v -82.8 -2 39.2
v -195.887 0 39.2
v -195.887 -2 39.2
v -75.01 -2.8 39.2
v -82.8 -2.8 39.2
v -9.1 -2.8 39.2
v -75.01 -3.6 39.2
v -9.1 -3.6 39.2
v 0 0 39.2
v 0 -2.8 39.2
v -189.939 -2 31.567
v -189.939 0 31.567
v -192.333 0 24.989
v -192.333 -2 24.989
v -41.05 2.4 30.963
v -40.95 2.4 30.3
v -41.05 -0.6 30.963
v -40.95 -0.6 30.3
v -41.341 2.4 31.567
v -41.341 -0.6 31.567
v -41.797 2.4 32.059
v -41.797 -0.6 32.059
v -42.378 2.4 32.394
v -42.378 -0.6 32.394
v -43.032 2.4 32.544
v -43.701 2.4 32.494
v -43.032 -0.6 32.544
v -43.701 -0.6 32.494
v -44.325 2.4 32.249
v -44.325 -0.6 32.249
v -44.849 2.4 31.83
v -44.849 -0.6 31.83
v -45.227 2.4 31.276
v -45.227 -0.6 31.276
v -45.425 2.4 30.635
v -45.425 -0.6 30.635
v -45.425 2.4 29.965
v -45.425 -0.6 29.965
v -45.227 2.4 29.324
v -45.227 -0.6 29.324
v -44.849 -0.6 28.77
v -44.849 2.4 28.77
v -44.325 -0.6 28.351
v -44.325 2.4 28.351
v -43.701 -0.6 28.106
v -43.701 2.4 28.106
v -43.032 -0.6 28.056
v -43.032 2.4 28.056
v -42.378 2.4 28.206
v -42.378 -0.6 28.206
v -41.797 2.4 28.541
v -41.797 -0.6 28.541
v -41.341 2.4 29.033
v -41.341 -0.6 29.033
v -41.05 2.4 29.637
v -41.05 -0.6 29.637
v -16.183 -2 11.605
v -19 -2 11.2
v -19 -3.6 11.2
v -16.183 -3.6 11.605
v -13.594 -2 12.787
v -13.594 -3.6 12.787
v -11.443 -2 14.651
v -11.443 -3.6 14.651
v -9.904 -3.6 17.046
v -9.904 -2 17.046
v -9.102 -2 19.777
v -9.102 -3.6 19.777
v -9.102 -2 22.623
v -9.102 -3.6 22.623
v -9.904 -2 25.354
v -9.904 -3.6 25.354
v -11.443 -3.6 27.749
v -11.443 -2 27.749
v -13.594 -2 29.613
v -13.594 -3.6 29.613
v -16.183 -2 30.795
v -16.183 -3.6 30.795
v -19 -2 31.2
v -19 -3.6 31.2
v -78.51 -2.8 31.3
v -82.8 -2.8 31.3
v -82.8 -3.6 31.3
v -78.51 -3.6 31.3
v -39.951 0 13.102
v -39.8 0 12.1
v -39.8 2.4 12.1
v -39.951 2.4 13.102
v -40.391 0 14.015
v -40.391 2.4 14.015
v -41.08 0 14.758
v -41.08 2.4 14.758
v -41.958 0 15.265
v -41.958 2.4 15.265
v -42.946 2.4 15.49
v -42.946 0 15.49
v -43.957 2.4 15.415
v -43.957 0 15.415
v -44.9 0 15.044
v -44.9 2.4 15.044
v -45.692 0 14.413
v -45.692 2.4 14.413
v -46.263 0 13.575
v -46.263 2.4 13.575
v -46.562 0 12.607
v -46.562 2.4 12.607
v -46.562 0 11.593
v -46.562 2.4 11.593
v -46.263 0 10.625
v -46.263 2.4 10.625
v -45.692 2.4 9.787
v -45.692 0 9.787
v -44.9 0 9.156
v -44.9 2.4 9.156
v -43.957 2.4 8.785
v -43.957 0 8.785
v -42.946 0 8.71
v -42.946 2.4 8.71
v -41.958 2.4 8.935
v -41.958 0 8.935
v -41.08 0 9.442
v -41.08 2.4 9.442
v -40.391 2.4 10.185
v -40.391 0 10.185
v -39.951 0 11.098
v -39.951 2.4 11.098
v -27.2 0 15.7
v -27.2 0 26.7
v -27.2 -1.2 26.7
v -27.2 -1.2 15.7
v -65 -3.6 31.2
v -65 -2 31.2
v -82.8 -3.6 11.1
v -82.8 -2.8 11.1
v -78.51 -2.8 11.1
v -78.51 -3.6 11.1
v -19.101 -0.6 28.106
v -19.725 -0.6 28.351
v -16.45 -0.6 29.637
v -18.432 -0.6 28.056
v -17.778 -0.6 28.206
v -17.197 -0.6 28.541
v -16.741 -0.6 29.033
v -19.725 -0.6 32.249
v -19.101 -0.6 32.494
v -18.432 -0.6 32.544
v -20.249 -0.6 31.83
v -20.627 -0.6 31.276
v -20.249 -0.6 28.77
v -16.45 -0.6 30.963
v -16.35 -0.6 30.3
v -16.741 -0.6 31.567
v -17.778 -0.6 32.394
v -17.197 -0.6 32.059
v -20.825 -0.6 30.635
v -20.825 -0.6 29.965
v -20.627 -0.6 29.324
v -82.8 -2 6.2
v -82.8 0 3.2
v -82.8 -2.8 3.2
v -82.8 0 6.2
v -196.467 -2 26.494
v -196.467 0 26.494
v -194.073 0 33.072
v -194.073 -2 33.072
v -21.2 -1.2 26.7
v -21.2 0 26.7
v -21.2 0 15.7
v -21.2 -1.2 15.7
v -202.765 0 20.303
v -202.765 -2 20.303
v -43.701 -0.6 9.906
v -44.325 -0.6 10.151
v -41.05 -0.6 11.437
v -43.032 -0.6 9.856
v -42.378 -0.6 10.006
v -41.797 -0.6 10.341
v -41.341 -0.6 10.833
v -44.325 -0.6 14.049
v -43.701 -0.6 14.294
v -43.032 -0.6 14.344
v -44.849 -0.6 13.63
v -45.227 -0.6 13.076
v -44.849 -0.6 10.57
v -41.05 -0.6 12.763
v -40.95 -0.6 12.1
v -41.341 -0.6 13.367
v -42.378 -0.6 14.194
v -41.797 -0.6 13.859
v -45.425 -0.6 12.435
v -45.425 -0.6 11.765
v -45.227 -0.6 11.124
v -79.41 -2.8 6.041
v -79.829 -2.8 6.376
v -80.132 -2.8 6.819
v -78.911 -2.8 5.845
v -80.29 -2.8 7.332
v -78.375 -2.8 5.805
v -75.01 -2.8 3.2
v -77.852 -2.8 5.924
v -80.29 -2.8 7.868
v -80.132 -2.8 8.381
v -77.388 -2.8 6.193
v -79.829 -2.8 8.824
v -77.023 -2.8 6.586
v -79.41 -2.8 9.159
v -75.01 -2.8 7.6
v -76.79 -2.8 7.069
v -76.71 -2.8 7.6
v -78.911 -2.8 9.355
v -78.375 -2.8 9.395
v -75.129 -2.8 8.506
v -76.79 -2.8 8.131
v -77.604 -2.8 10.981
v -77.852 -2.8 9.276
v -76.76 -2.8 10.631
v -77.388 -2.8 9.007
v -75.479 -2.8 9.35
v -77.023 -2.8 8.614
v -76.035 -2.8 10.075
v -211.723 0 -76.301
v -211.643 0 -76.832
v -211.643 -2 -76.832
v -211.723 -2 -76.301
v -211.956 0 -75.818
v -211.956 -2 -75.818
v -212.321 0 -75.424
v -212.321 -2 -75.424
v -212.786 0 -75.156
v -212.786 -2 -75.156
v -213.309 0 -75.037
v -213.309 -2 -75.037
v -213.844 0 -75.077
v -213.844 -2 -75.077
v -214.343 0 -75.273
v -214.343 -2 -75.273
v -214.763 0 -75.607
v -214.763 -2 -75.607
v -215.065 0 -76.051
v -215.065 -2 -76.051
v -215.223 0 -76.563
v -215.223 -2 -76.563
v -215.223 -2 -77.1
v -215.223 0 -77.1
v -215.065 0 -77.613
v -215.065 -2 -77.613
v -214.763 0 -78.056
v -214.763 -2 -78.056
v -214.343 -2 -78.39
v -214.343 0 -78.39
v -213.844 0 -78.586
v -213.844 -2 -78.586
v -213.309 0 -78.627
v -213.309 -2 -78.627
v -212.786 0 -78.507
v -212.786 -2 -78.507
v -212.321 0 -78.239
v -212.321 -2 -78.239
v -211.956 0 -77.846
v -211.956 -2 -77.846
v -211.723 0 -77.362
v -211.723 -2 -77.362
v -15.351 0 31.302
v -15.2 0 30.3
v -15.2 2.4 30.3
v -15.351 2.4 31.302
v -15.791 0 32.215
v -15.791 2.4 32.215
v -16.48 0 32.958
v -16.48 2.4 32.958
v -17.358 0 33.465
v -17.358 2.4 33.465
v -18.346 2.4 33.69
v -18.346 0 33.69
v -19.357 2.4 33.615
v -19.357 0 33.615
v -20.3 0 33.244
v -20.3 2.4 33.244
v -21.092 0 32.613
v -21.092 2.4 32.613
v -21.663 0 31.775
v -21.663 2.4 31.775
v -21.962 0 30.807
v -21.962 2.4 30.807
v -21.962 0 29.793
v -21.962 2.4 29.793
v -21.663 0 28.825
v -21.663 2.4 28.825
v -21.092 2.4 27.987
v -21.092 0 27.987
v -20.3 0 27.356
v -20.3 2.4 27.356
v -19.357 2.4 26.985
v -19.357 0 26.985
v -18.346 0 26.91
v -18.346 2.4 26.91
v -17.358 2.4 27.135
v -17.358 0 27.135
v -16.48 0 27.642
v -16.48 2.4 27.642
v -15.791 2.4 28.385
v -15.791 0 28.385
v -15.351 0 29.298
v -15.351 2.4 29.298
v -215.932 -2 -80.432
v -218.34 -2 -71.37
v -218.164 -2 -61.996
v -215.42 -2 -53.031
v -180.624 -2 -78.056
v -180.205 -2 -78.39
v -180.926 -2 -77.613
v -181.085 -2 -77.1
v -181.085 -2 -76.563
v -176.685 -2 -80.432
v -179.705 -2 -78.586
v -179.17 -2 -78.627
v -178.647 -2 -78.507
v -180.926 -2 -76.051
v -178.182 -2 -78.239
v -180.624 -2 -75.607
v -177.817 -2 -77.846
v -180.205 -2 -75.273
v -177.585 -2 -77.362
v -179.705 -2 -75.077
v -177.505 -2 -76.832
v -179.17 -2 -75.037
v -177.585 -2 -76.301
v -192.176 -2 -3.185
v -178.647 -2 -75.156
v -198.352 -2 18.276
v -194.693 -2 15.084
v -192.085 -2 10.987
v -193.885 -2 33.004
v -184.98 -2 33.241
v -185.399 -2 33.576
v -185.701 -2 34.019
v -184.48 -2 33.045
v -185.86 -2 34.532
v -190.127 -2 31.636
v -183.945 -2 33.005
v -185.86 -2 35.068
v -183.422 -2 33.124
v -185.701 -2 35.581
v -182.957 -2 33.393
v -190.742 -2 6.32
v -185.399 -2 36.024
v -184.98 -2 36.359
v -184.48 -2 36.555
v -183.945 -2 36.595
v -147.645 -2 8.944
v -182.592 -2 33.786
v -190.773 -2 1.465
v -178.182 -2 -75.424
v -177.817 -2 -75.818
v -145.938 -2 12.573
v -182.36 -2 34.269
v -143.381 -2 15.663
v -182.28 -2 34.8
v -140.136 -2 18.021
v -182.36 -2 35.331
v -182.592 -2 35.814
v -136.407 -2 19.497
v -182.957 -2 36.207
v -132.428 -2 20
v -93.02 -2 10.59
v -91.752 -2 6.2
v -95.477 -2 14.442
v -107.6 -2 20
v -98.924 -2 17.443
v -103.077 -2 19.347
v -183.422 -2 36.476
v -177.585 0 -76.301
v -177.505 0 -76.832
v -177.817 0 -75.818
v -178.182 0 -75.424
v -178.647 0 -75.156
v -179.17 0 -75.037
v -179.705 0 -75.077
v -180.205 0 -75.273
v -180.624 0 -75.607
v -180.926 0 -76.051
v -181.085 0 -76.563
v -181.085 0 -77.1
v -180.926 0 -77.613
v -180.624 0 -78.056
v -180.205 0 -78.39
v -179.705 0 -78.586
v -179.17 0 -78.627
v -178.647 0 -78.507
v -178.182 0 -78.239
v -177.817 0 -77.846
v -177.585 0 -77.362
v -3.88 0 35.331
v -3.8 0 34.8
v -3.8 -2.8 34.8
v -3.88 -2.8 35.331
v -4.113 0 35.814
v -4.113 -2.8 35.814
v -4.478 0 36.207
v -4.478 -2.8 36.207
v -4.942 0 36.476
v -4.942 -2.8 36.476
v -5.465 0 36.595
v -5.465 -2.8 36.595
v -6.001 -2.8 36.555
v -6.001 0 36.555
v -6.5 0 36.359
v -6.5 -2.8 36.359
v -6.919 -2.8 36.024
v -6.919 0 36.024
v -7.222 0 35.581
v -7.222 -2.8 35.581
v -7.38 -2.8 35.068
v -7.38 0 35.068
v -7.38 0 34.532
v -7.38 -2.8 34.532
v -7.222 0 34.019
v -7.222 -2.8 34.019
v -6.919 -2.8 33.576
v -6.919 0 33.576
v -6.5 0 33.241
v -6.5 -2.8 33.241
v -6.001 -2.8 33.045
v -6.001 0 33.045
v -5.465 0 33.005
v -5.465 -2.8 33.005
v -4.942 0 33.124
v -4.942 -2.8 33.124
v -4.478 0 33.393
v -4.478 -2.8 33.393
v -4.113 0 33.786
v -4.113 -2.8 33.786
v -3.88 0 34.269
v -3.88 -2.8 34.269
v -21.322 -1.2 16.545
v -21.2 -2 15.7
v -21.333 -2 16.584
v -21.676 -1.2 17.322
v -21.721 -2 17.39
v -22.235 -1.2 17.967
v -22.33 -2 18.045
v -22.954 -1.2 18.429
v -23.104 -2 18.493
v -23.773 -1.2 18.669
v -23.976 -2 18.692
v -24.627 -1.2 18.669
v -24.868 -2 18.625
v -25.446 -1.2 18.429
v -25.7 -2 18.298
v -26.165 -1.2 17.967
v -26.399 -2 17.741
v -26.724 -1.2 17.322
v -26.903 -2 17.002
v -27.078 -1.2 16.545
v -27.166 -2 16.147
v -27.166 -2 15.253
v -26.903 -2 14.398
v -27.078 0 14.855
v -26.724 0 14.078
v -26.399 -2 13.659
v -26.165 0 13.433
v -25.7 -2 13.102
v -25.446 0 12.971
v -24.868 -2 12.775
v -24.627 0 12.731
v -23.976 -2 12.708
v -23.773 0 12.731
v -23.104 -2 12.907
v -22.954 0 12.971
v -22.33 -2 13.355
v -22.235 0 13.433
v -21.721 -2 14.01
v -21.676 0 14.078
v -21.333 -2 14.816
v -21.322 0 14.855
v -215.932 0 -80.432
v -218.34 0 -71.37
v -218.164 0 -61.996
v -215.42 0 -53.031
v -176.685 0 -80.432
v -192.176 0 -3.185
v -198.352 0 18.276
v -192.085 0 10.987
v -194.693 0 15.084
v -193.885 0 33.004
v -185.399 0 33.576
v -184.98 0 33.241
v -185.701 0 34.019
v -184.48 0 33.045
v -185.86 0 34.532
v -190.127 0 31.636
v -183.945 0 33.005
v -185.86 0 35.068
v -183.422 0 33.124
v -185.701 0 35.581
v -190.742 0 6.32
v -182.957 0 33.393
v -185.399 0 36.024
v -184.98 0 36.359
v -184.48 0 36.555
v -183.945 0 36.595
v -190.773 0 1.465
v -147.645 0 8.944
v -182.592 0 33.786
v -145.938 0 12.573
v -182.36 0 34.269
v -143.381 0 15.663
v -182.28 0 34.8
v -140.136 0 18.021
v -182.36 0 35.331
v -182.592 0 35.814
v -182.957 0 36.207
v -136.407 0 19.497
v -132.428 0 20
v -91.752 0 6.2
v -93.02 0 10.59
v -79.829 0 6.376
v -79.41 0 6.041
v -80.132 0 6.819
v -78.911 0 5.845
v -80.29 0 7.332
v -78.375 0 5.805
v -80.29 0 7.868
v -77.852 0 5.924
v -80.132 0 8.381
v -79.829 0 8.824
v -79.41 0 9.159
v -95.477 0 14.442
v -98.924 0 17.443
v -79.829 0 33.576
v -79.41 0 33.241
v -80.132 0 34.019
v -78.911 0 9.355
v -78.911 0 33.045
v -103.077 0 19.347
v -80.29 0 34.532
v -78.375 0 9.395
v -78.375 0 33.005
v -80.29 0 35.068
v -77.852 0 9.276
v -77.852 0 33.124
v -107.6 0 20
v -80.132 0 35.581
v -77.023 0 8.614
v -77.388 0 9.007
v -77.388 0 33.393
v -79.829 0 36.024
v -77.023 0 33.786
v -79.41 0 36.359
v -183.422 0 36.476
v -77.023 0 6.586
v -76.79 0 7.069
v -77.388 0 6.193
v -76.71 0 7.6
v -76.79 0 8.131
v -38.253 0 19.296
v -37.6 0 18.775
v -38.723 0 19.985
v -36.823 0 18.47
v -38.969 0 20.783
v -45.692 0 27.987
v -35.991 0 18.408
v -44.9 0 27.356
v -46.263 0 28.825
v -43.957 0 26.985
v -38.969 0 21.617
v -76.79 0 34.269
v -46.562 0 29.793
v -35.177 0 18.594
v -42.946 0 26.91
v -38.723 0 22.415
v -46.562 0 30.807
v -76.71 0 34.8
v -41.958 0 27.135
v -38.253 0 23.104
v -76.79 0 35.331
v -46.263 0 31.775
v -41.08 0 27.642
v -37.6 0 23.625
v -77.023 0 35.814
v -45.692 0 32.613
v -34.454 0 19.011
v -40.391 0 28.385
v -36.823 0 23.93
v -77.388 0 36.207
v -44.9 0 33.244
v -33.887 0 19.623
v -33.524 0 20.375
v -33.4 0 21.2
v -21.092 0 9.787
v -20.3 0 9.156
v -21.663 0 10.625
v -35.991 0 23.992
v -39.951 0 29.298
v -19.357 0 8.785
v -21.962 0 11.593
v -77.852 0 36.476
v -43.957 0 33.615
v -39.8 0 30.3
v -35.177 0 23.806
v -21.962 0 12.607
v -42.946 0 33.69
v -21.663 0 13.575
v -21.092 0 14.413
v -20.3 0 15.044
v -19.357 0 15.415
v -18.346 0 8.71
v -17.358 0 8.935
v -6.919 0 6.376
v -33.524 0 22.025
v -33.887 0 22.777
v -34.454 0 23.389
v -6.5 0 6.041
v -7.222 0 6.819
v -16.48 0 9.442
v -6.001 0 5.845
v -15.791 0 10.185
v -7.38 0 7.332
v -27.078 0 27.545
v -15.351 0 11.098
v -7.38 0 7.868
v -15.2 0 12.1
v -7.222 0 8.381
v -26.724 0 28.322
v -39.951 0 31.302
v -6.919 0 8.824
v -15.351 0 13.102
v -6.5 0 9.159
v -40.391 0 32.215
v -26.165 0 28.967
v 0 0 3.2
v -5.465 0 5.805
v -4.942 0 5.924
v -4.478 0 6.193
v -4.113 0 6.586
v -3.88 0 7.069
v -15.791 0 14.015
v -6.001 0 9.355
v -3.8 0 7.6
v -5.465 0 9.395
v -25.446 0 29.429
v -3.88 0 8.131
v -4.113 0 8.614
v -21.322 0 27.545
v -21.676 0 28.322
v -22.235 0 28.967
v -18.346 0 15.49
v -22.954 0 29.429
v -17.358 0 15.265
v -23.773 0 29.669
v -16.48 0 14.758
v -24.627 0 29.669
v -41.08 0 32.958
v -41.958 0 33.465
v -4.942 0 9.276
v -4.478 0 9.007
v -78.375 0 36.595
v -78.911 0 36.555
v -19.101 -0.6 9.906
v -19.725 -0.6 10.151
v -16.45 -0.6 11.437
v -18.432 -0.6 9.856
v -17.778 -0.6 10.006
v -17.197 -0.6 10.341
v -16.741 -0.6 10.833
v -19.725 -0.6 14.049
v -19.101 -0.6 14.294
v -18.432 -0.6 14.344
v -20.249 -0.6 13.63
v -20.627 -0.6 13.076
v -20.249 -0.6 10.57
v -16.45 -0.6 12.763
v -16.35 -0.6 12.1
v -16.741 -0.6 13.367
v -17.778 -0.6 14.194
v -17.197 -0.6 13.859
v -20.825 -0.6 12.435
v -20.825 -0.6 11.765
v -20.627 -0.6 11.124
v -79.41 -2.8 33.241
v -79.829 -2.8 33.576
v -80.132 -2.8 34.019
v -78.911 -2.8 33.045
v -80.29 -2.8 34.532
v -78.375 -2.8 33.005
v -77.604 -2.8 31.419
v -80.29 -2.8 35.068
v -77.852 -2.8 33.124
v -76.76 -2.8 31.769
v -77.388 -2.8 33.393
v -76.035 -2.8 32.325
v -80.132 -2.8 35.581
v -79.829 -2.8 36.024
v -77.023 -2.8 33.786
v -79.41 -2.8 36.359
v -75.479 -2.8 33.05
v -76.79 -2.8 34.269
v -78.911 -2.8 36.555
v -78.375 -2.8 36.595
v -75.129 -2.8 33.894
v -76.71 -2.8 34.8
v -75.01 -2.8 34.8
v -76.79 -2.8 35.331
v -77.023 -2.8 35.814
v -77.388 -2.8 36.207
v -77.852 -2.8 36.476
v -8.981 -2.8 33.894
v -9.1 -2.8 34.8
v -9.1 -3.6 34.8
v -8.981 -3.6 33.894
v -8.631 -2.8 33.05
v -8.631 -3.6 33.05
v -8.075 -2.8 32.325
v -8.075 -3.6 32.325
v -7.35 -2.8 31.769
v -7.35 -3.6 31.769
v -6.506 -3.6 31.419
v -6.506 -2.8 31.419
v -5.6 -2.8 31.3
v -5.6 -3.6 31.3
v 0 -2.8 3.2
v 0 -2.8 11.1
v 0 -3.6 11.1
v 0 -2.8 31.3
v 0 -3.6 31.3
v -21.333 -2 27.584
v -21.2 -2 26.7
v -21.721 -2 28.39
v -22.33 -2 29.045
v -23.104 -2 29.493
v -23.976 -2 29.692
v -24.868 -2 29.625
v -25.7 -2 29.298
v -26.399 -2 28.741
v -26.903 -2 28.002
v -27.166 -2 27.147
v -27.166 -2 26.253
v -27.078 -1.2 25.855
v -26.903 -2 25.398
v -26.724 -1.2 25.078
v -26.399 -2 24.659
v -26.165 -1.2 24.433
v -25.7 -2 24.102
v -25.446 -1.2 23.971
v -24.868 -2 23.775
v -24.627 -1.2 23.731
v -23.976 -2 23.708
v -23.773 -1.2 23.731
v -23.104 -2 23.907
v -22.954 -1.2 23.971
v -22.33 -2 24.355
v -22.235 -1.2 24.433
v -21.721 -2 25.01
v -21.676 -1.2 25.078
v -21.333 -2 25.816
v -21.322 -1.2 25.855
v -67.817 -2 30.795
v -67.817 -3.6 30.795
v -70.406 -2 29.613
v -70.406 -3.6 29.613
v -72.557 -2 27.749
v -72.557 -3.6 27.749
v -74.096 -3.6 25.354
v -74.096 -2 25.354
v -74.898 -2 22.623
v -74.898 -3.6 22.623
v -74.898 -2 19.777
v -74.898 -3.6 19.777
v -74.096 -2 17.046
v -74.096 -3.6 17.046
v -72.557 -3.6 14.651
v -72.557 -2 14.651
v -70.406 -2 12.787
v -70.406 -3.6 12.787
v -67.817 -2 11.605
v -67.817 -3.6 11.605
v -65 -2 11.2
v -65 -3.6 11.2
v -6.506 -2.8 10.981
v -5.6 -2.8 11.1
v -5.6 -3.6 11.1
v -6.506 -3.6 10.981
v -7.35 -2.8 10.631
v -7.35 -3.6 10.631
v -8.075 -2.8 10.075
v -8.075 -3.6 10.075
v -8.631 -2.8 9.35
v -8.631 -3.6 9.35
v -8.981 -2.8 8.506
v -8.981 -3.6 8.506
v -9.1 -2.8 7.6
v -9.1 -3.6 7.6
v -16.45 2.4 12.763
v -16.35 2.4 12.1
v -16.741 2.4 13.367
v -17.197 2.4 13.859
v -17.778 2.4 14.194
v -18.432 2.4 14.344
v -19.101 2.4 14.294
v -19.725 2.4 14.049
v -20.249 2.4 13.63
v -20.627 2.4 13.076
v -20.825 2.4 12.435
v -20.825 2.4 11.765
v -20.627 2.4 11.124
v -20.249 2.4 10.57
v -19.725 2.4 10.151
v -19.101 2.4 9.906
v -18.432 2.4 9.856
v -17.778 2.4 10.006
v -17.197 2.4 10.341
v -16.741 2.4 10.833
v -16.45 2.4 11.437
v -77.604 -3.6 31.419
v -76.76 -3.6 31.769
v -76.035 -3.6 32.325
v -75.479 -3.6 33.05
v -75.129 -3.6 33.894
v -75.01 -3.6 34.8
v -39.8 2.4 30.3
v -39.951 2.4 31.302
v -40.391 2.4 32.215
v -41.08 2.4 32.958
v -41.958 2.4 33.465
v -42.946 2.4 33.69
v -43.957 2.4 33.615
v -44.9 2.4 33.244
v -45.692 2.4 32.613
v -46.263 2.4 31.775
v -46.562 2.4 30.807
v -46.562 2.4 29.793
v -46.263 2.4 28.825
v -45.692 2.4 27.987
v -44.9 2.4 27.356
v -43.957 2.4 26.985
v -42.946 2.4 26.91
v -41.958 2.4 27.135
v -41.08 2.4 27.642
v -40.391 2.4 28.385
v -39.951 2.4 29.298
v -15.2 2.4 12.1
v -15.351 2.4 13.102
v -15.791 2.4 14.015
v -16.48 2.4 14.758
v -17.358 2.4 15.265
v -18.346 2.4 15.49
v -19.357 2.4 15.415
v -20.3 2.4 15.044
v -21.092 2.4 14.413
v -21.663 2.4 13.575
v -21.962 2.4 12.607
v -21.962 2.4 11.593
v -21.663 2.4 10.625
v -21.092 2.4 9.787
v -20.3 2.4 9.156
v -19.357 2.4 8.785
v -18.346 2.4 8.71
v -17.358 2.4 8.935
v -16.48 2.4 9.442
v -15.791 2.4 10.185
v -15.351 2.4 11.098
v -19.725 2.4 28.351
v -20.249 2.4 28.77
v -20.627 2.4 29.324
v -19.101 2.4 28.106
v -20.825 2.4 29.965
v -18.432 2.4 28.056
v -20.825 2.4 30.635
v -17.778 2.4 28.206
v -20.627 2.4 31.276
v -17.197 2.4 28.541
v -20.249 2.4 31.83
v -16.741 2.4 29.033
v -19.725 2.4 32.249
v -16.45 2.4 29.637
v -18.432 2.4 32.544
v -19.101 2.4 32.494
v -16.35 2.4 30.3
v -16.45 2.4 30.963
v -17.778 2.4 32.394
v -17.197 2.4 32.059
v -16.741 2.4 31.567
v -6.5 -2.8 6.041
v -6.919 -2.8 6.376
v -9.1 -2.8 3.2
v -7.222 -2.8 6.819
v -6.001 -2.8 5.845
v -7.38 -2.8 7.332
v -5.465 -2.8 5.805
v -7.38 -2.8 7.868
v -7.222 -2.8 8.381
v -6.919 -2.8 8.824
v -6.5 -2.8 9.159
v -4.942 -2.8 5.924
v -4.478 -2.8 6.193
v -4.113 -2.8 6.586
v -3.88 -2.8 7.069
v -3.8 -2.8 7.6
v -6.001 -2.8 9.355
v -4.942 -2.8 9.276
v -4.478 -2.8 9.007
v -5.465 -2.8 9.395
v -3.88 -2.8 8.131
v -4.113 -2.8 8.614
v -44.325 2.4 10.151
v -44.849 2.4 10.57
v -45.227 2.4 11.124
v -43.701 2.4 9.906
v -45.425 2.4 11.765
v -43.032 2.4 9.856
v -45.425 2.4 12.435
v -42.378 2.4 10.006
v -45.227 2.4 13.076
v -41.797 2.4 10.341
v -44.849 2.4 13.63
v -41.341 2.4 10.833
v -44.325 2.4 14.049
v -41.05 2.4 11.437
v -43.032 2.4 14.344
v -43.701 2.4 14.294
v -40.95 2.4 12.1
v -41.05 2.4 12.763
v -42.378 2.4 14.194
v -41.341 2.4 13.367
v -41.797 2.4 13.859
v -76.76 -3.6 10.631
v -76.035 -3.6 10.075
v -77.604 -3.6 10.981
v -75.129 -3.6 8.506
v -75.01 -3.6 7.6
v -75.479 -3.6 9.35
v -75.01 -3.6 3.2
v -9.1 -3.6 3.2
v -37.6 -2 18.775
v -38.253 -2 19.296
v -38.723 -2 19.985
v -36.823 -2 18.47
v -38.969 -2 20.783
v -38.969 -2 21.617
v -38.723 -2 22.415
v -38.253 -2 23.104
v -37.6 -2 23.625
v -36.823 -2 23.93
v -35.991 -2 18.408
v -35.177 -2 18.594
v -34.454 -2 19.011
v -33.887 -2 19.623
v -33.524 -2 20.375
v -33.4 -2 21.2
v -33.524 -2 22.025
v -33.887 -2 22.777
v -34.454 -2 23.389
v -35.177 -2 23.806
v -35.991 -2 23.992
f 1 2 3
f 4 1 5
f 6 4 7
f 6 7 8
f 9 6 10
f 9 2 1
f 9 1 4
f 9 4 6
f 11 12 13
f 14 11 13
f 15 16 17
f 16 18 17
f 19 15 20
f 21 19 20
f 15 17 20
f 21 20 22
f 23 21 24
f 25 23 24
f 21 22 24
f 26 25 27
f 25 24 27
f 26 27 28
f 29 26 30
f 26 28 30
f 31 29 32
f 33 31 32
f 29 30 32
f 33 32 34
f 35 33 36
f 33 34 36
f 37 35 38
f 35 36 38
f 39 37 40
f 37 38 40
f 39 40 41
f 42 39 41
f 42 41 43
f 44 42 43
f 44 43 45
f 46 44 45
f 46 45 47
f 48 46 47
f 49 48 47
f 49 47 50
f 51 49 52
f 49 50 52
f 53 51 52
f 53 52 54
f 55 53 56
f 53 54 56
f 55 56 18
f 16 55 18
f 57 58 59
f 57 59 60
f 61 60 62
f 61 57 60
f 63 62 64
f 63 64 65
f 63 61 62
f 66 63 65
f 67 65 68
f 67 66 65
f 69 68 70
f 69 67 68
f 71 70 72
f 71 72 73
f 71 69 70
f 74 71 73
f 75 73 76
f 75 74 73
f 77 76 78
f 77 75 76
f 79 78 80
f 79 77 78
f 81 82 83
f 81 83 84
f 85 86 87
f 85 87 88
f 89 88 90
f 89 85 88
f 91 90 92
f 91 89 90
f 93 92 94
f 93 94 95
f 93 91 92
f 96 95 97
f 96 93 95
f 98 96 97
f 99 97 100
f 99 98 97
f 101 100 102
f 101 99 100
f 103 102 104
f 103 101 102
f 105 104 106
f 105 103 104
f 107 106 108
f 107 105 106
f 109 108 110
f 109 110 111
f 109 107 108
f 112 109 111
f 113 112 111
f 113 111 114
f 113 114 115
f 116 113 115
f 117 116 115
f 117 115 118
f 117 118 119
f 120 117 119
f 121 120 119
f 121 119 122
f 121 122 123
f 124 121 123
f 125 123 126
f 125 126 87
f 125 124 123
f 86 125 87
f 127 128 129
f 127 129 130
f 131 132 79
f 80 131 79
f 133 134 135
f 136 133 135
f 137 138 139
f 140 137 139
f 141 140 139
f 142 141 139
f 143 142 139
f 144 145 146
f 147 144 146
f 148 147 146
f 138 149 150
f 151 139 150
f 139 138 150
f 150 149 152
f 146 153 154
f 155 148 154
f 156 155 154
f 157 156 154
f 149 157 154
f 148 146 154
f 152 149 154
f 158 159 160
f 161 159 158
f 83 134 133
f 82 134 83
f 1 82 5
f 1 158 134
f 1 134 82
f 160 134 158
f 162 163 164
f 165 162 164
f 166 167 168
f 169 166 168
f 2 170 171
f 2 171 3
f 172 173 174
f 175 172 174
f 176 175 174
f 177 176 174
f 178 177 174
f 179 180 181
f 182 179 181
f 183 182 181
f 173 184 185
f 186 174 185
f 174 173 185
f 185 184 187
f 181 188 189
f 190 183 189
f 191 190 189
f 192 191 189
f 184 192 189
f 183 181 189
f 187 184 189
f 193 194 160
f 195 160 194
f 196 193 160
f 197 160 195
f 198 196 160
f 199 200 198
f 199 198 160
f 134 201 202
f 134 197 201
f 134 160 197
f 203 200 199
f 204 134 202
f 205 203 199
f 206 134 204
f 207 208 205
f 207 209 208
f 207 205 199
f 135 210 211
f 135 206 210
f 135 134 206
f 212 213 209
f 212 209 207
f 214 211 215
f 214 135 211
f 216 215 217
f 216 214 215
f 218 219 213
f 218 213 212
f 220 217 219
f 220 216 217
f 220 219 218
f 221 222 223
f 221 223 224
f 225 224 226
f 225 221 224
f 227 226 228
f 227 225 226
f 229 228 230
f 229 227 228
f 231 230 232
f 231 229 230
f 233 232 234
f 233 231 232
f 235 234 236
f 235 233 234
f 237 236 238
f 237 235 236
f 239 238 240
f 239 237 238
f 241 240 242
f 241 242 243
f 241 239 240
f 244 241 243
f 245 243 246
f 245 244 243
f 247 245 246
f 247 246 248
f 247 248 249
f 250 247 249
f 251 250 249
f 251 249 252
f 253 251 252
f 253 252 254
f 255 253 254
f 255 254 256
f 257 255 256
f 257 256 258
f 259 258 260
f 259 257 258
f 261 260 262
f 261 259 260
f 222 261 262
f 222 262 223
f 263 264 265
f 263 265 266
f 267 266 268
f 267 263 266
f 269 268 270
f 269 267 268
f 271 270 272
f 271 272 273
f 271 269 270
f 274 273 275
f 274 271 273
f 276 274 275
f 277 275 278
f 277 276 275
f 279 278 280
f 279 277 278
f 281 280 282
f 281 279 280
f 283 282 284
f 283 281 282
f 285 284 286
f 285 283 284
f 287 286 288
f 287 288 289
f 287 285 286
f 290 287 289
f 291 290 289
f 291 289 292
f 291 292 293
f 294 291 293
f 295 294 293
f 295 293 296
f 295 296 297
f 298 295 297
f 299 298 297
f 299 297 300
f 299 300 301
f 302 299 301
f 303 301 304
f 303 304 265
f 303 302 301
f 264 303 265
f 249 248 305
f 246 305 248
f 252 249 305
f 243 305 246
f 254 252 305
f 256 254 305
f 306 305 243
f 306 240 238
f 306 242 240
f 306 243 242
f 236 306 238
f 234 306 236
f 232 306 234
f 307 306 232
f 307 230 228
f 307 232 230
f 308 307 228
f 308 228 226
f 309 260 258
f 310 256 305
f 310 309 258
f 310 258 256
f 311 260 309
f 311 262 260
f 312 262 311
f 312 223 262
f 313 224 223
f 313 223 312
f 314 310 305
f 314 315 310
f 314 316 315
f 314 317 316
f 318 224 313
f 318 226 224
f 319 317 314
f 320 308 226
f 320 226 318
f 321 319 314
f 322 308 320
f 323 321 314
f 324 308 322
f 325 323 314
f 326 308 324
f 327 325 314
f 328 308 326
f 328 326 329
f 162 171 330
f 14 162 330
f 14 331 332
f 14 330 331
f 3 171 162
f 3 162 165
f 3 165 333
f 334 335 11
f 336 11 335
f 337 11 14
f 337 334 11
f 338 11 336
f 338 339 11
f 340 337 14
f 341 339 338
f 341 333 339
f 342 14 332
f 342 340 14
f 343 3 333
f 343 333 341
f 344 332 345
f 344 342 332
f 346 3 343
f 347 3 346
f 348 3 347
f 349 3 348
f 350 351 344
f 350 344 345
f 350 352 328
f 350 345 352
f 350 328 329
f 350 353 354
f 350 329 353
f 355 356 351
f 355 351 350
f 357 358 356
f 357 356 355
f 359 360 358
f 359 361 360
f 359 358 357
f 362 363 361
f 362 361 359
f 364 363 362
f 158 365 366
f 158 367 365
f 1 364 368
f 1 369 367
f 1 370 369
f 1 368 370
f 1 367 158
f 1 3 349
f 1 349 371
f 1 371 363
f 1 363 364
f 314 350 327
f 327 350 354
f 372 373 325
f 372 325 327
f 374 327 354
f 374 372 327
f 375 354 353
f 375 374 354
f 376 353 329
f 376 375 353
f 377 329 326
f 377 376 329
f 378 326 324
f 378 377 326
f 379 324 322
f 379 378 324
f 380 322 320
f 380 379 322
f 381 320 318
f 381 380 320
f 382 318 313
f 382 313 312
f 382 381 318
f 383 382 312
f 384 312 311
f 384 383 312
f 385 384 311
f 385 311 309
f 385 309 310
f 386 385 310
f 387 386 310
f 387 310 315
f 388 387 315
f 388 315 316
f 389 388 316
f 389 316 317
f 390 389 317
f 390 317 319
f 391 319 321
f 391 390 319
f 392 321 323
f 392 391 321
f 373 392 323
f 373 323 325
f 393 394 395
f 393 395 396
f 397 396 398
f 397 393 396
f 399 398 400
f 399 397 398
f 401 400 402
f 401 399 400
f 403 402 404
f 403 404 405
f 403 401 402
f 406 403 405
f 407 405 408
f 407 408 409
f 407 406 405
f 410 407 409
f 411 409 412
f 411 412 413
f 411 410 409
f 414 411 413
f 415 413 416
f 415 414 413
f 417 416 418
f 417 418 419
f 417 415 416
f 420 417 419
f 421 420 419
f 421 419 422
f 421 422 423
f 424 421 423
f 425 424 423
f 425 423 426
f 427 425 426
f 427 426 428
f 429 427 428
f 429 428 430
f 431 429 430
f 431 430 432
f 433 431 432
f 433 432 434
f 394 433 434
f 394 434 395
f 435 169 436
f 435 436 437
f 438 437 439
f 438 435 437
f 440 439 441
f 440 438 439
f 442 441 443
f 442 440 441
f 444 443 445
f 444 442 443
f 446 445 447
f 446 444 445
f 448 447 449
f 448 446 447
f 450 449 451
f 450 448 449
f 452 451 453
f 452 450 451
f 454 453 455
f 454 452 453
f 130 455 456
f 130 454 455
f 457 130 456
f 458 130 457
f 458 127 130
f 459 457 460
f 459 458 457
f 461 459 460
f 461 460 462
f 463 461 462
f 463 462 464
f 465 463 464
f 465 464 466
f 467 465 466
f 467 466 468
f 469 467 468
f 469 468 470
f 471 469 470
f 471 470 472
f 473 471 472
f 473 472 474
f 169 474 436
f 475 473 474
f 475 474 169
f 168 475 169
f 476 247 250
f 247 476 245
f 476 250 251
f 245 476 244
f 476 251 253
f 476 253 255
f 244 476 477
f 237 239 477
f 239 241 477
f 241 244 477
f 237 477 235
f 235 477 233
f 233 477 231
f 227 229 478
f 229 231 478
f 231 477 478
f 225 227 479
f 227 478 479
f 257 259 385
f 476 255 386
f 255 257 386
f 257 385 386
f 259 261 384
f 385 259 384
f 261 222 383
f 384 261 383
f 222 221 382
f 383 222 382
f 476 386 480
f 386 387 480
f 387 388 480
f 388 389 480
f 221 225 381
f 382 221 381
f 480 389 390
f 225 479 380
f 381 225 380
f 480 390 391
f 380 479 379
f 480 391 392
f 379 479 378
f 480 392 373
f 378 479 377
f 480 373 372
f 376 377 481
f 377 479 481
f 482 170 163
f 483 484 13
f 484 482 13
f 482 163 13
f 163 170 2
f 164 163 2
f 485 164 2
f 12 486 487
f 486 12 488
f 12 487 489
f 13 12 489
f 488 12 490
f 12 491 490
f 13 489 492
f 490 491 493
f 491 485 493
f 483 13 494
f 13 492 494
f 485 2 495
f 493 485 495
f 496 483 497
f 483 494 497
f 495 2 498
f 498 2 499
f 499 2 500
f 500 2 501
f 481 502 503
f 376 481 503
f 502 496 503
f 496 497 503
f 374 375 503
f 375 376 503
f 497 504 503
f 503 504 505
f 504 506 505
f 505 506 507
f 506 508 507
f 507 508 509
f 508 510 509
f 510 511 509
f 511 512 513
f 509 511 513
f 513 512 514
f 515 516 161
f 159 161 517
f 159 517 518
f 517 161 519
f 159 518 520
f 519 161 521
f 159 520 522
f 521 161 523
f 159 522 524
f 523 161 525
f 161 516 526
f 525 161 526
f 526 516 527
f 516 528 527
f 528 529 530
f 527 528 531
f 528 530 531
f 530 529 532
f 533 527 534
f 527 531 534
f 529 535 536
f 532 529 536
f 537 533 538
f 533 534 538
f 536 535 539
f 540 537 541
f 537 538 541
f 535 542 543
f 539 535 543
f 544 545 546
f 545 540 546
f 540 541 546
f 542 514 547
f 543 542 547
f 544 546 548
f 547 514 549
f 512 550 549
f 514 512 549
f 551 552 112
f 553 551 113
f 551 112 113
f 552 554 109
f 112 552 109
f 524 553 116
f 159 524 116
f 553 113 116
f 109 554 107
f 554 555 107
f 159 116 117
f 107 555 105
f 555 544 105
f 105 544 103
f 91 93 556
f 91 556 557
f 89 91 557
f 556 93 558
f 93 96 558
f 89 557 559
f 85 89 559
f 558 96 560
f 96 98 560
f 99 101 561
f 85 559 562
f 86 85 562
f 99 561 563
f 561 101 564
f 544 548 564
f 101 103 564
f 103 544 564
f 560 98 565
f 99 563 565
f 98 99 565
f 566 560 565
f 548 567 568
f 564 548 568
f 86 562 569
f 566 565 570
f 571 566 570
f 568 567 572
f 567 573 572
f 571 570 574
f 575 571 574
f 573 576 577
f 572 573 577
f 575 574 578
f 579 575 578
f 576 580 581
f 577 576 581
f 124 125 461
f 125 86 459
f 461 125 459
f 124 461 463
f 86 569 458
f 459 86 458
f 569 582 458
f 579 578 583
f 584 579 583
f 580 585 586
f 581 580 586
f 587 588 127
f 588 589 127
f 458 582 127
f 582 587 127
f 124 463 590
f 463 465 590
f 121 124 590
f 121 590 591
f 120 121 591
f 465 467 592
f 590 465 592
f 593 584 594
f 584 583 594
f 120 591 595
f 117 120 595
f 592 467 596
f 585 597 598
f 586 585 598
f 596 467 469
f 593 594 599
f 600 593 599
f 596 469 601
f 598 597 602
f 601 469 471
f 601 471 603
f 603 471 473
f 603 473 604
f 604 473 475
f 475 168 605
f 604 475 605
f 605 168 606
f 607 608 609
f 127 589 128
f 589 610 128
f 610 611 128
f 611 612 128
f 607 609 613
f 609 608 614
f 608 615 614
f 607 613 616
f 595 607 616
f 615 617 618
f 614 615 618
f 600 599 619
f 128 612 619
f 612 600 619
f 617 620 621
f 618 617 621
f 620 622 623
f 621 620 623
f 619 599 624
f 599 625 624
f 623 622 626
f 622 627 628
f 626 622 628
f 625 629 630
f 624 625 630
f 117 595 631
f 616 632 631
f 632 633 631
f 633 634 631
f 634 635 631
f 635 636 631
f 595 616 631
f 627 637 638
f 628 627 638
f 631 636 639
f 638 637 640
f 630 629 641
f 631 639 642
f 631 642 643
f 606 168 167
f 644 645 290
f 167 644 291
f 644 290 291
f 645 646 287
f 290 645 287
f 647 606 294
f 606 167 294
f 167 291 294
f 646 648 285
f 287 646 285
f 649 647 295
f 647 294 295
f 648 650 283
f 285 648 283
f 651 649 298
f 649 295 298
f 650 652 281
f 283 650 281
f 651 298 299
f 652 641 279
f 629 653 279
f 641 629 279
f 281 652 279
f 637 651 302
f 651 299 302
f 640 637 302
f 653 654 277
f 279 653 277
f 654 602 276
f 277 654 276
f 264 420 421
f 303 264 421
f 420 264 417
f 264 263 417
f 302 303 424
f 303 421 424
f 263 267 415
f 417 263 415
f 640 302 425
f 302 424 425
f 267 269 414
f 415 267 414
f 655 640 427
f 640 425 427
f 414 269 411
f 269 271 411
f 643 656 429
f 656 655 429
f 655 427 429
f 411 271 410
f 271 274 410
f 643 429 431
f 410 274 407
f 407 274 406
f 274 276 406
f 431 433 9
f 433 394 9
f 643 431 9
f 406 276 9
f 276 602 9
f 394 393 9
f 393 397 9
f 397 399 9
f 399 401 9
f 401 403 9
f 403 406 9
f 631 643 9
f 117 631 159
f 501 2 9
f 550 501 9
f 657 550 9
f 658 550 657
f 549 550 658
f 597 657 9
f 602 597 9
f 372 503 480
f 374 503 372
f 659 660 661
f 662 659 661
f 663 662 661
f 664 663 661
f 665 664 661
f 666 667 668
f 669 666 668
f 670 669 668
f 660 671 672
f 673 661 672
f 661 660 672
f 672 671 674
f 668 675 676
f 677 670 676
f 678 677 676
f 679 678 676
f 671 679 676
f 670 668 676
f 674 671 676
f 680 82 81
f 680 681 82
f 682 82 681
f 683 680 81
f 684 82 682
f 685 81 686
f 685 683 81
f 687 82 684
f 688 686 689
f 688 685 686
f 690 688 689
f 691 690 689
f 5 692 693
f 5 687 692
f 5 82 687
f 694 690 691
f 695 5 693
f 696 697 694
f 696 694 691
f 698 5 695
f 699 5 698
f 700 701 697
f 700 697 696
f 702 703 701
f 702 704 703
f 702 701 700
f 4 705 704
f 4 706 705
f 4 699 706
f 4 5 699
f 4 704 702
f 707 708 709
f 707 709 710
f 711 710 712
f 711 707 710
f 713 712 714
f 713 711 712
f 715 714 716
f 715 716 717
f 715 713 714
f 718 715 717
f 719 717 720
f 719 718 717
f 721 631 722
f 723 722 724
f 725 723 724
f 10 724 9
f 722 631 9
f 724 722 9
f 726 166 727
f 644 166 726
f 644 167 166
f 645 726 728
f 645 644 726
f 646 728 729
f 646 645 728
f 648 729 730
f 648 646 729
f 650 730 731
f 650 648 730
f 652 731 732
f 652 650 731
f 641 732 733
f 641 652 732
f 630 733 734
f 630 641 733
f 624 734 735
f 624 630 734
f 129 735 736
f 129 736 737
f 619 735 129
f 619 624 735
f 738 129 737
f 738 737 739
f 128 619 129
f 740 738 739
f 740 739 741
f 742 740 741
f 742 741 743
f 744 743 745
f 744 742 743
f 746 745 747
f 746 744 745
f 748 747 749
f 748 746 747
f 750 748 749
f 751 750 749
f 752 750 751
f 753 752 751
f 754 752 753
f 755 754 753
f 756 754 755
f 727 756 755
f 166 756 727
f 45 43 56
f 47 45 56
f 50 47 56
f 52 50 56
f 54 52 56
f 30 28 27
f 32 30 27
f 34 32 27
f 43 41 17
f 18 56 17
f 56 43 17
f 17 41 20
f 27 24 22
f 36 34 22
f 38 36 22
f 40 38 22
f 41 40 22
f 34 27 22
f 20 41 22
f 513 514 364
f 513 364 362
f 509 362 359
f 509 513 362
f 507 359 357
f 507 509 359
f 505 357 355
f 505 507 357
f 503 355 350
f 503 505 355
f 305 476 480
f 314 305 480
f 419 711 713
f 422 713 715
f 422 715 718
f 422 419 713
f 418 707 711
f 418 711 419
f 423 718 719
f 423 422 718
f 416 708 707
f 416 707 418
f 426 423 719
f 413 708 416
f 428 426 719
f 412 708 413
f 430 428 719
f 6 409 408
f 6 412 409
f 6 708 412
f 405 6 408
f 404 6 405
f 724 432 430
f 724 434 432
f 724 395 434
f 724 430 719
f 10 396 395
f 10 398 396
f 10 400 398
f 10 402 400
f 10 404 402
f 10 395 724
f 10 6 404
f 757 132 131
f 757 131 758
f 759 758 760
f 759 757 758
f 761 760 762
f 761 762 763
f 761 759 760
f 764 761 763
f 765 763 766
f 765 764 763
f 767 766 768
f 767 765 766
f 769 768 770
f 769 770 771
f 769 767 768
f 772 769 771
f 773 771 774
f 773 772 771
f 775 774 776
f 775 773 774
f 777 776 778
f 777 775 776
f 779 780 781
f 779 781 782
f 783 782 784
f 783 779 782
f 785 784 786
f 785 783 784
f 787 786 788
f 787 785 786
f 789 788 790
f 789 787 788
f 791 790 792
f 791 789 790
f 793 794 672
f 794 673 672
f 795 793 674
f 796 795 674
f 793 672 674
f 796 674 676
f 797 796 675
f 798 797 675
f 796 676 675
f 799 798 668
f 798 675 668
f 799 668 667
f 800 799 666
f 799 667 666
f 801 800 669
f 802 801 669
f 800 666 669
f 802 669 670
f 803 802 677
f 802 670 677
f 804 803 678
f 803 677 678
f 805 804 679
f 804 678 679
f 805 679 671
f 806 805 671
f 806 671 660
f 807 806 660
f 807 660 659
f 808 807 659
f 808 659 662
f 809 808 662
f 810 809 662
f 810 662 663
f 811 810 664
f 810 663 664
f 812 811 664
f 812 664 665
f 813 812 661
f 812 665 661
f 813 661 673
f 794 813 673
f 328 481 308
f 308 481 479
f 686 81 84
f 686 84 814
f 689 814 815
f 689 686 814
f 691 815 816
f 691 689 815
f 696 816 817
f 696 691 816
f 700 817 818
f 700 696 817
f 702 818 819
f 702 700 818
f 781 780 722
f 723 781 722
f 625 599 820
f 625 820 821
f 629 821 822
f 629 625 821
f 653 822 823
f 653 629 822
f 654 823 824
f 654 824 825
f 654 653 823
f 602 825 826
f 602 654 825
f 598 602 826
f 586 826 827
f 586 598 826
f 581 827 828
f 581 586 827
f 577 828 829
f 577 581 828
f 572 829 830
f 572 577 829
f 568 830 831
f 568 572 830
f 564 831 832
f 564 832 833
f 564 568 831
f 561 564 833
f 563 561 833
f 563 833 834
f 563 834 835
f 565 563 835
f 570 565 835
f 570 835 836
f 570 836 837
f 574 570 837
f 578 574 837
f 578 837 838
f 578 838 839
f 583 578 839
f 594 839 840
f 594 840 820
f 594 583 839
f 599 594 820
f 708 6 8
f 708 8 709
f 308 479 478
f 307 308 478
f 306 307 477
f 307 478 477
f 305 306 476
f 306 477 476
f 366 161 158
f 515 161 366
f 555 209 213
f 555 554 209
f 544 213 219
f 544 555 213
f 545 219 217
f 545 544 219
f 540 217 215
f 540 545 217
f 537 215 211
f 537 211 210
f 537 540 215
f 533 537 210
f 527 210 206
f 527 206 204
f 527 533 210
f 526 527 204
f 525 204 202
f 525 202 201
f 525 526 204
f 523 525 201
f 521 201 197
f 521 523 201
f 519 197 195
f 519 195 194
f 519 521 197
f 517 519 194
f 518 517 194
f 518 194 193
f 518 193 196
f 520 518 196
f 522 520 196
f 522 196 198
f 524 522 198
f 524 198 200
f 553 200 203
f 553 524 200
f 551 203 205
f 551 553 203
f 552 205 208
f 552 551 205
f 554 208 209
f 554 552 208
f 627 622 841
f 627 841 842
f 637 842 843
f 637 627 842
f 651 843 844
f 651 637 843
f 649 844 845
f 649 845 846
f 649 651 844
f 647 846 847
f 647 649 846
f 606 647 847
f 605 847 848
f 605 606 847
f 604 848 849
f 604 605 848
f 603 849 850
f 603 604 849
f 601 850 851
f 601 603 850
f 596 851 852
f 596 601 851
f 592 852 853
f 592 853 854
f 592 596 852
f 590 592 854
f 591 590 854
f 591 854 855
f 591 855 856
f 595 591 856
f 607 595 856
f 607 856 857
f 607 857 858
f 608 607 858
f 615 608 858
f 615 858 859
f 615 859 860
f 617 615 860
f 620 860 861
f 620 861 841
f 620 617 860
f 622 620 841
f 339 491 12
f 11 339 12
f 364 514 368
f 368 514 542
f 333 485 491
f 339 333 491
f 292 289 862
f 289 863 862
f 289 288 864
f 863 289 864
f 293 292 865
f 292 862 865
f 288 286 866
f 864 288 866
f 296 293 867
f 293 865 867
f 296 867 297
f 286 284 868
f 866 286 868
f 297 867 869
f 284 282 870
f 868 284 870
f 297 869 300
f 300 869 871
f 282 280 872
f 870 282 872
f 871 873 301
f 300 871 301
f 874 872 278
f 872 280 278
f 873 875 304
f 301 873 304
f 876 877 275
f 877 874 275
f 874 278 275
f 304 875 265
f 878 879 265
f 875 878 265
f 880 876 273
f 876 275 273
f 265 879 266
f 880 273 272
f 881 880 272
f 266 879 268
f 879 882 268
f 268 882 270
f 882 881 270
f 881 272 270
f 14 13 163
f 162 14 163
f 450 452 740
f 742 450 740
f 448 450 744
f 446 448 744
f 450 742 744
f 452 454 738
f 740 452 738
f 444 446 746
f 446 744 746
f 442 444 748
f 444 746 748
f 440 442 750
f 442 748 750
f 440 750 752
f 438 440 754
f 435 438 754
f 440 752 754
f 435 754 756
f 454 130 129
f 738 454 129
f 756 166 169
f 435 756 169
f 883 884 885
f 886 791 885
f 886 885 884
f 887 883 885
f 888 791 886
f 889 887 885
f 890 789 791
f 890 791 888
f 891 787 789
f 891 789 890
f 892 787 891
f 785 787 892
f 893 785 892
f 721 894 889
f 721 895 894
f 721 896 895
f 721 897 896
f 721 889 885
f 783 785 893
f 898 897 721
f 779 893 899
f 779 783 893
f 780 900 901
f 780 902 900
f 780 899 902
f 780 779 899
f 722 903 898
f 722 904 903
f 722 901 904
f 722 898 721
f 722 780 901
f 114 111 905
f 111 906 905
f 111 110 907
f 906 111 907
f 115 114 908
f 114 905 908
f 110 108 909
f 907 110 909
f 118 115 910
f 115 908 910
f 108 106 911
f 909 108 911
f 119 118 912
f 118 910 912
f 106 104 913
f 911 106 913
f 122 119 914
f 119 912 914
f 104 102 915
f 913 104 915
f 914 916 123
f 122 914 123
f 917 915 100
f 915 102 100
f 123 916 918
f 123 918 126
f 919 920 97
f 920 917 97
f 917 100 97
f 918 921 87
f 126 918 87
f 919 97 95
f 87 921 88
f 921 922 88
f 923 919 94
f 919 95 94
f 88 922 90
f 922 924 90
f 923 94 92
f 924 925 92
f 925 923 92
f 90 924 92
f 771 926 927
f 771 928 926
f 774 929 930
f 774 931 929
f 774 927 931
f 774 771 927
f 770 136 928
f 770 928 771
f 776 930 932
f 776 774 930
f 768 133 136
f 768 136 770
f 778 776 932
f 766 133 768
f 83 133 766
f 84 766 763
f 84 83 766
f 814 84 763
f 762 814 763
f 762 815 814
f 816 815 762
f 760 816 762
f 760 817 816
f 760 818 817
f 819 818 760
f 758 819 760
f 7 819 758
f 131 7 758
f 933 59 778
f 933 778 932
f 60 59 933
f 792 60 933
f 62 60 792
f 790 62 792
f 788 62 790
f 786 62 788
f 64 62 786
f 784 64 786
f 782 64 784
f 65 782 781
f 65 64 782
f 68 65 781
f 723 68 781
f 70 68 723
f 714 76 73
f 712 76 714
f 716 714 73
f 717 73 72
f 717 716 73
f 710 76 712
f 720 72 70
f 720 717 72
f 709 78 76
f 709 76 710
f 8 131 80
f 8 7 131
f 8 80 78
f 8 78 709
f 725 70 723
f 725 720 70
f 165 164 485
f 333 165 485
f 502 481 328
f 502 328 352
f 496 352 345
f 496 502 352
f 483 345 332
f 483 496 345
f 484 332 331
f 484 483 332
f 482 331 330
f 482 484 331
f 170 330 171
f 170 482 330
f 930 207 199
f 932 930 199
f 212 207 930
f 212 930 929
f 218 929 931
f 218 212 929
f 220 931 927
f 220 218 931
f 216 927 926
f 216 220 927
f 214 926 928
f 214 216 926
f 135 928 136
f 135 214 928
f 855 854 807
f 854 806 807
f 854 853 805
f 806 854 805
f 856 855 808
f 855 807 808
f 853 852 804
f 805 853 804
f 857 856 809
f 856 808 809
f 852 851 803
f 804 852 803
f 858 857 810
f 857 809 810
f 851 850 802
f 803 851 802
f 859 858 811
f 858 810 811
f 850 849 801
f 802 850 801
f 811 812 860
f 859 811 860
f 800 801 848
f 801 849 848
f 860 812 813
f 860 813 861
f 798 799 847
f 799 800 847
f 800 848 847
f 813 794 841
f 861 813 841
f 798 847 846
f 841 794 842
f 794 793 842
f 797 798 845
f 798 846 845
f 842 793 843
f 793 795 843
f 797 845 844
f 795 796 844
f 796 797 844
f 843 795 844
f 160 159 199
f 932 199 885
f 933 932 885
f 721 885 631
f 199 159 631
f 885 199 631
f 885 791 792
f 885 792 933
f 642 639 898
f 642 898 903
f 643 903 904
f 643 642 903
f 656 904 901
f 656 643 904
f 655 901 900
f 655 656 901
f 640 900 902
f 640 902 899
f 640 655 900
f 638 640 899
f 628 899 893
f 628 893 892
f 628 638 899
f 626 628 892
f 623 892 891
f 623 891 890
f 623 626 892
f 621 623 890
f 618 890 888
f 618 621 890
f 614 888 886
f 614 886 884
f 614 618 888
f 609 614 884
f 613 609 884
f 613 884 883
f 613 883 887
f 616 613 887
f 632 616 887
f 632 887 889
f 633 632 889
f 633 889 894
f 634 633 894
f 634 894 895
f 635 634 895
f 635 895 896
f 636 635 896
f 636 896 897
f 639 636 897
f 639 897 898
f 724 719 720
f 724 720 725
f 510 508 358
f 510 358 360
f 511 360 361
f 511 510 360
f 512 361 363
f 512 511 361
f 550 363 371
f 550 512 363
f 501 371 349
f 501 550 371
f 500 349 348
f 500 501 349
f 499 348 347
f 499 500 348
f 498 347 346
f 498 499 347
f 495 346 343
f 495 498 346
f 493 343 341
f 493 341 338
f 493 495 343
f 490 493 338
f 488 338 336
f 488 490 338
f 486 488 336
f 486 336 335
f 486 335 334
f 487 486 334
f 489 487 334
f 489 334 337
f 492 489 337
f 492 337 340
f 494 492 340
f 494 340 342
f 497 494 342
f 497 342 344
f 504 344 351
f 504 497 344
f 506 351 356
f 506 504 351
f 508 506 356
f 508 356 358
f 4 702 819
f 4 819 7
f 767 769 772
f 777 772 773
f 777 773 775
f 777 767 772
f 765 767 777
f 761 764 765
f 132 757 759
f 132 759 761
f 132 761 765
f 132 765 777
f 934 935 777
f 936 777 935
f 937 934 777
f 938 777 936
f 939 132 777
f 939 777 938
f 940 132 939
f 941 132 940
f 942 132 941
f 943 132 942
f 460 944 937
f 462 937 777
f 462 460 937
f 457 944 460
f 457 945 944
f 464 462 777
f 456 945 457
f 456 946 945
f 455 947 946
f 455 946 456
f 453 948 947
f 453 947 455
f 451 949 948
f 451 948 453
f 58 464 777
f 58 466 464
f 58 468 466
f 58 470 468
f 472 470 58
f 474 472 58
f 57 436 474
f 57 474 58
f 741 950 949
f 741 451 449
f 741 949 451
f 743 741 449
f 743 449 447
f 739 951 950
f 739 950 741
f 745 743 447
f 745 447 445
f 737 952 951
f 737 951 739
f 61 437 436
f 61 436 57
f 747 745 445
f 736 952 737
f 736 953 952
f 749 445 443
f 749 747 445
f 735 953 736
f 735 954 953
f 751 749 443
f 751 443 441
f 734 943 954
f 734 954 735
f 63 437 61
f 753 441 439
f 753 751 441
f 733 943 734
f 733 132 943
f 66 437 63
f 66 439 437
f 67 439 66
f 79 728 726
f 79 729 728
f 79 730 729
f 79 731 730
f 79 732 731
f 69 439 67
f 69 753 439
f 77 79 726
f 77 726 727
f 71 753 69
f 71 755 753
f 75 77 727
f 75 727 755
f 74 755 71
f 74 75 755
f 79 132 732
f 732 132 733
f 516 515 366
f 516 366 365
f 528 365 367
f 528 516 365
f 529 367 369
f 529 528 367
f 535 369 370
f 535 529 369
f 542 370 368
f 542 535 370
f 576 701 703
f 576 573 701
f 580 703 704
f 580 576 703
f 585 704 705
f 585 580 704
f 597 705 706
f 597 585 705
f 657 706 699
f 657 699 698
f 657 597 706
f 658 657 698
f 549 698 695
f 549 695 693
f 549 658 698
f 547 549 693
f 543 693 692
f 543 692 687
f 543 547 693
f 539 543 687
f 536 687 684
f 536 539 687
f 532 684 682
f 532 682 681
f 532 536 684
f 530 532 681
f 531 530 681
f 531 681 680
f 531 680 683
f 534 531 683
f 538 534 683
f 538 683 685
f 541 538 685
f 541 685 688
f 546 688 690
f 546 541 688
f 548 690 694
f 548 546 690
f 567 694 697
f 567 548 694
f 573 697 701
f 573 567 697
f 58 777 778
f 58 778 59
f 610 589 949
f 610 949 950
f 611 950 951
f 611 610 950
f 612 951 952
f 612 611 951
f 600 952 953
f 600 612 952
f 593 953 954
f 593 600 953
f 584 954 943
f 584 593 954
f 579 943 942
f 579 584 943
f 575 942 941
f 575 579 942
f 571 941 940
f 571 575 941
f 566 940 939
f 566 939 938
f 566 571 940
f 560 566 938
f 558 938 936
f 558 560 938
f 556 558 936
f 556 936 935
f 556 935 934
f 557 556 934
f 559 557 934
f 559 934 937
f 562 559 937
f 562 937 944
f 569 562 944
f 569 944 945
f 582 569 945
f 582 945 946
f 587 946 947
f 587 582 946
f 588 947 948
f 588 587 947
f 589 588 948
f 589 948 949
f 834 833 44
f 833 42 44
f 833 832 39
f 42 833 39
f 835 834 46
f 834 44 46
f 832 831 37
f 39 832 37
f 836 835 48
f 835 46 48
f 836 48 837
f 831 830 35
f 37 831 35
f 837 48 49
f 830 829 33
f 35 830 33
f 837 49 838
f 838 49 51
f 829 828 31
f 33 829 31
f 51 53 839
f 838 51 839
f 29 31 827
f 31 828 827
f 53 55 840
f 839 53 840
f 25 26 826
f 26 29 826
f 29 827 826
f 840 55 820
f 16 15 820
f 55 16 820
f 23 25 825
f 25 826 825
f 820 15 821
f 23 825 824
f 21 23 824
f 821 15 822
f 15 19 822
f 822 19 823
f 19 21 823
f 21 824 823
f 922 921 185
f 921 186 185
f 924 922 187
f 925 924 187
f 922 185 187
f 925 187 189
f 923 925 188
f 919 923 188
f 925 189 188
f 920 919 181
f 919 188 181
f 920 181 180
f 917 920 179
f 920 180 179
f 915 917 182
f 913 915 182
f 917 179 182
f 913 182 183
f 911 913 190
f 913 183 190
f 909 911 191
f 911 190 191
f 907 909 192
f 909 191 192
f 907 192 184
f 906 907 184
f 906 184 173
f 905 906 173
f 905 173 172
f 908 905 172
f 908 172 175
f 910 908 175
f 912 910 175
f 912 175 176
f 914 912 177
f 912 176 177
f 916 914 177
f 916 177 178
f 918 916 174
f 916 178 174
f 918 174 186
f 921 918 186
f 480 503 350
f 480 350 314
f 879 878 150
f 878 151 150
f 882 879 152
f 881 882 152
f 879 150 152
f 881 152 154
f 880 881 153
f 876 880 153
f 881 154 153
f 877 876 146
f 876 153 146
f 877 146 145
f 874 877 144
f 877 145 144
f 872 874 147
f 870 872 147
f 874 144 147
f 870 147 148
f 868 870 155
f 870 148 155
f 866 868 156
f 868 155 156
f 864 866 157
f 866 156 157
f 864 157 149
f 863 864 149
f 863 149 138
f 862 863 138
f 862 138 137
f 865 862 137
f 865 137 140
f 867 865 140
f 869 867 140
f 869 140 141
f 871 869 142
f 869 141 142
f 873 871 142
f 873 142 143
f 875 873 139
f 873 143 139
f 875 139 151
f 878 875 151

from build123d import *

# Parameters (mm, degrees)
SKETCH085_R           = 1.8
EXTRUDE085_DEPTH      = 0.8
SKETCH083_W           = 82.8
SKETCH083_H           = 36
SKETCH083_R           = 1.8
EXTRUDE083_DEPTH      = 1.6
SKETCH080_R           = 2.25
EXTRUDE081_DEPTH      = 0.6
EXTRUDE081_DEPTH_BACK = 2.4
SKETCH081_R           = 3.4
EXTRUDE080_DEPTH      = 2.4
EXTRUDE079_DEPTH      = 1.2
SKETCH075_R           = 1.8
SKETCH075_R_2         = 2.8
SKETCH075_R_3         = 3
EXTRUDE078_DEPTH      = 2


with BuildPart() as extrude085:
    # Sketch085 → Extrude085 (new body)
    with BuildSketch(Plane.XZ):
        with BuildLine():
            ThreePointArc((-78.51, 31.3), (-76.035126, 32.325126), (-75.01, 34.8))
            Line((-75.01, 34.8), (-75.01, 39.2))
            Line((-82.8, 39.2), (-75.01, 39.2))
            Line((-82.8, 31.3), (-82.8, 39.2))
            Line((-82.8, 31.3), (-78.51, 31.3))
        make_face()
        with Locations((-78.51, 34.8)):
            Circle(SKETCH085_R, mode=Mode.SUBTRACT)
        with BuildLine():
            ThreePointArc((-9.1, 34.8), (-8.074874, 32.325126), (-5.6, 31.3))
            Line((-5.6, 31.3), (0, 31.3))
            Line((0, 39.2), (0, 31.3))
            Line((-9.1, 39.2), (0, 39.2))
            Line((-9.1, 39.2), (-9.1, 34.8))
        make_face()
        with Locations((-5.6, 34.8)):
            Circle(SKETCH085_R, mode=Mode.SUBTRACT)
        with BuildLine():
            ThreePointArc((-75.01, 7.6), (-76.035126, 10.074874), (-78.51, 11.1))
            Line((-82.8, 11.1), (-78.51, 11.1))
            Line((-82.8, 3.2), (-82.8, 11.1))
            Line((-75.01, 3.2), (-82.8, 3.2))
            Line((-75.01, 7.6), (-75.01, 3.2))
        make_face()
        with Locations((-78.51, 7.6)):
            Circle(SKETCH085_R, mode=Mode.SUBTRACT)
        with BuildLine():
            ThreePointArc((-5.6, 11.1), (-8.074874, 10.074874), (-9.1, 7.6))
            Line((-9.1, 7.6), (-9.1, 3.2))
            Line((-9.1, 3.2), (0, 3.2))
            Line((0, 3.2), (0, 11.1))
            Line((-5.6, 11.1), (0, 11.1))
        make_face()
        with Locations((-5.6, 7.6)):
            Circle(SKETCH085_R, mode=Mode.SUBTRACT)
    extrude(amount=EXTRUDE085_DEPTH)


with BuildPart() as extrude085_1:
    # Extrude085 placement: moved
    add(extrude085.part.moved(Location((0, -2.8, 0))))


with BuildPart() as cut048:
    # Sketch083 → Extrude083 (new body)
    with BuildSketch(Plane.XZ):
        with Locations((-41.4, 21.2)):
            Rectangle(SKETCH083_W, SKETCH083_H)
        with Locations((-78.51, 34.8)):
            Circle(SKETCH083_R, mode=Mode.SUBTRACT)
        with Locations((-5.6, 34.8)):
            Circle(SKETCH083_R, mode=Mode.SUBTRACT)
        with Locations((-5.6, 7.6)):
            Circle(SKETCH083_R, mode=Mode.SUBTRACT)
        with Locations((-78.51, 7.6)):
            Circle(SKETCH083_R, mode=Mode.SUBTRACT)
        with BuildLine():
            ThreePointArc((-65, 31.2), (-75, 21.2), (-65, 11.2))
            Line((-65, 11.2), (-19, 11.2))
            ThreePointArc((-19, 11.2), (-9, 21.2), (-19, 31.2))
            Line((-65, 31.2), (-19, 31.2))
        make_face(mode=Mode.SUBTRACT)
    extrude(amount=EXTRUDE083_DEPTH)


with BuildPart() as cut048_1:
    # Extrude083 placement: moved
    add(cut048.part.moved(Location((0, -2, 0))))

    # Cut048: cut Extrude085
    add(extrude085_1.part, mode=Mode.SUBTRACT)


with BuildPart() as extrude081:
    # Sketch080 → Extrude081 (new body, two sides)
    with BuildSketch(Plane.XZ) as extrude081_sk:
        with Locations((-18.6, 12.1)):
            Circle(SKETCH080_R)
        with Locations((-18.6, 30.3)):
            Circle(SKETCH080_R)
        with Locations((-43.2, 30.3)):
            Circle(SKETCH080_R)
        with Locations((-43.2, 12.1)):
            Circle(SKETCH080_R)
    extrude(amount=EXTRUDE081_DEPTH)
    extrude(extrude081_sk.sketch, amount=-EXTRUDE081_DEPTH_BACK)


with BuildPart() as extrude080:
    # Sketch081 → Extrude080 (new body)
    with BuildSketch(Plane.XZ):
        with Locations((-43.2, 30.3)):
            Circle(SKETCH081_R)
        with Locations((-18.6, 30.3)):
            Circle(SKETCH081_R)
        with Locations((-43.2, 12.1)):
            Circle(SKETCH081_R)
        with Locations((-18.6, 12.1)):
            Circle(SKETCH081_R)
    extrude(amount=-EXTRUDE080_DEPTH)


with BuildPart() as extrude_lato_dx_pistola_scavi_pulsanti:
    # Sketch077 → Extrude079 (new body)
    with BuildSketch(Plane.XZ):
        with BuildLine():
            Line((-27.2, 26.7), (-27.2, 15.7))
            ThreePointArc((-27.2, 15.7), (-24.2, 12.7), (-21.2, 15.7))
            Line((-21.2, 26.700018), (-21.2, 15.7))
            ThreePointArc((-21.2, 26.700018), (-24.200009, 29.7), (-27.2, 26.7))
        make_face()
    extrude(amount=EXTRUDE079_DEPTH)


with BuildPart() as fusion006:
    # Sketch075 → Extrude078 (new body)
    with BuildSketch(Plane.XZ):
        with BuildLine():
            Line((-82.8, 3.2), (0, 3.2))
            Line((0, 3.2), (0, 39.2))
            Line((-195.886839, 39.2), (0, 39.2))
            Line((-202.764796, 20.302968), (-195.886839, 39.2))
            ThreePointArc((-192.175575, -3.18451), (-192.085048, 10.987093), (-202.764796, 20.302968))
            Line((-192.175575, -3.18451), (-215.419579, -53.031439))
            ThreePointArc((-215.419579, -53.031439), (-218.578907, -66.677212), (-215.93199, -80.431568))
            Line((-215.93199, -80.431568), (-176.68528, -80.431568))
            Line((-147.645309, 8.944272), (-176.68528, -80.431568))
            ThreePointArc((-132.428405, 20), (-141.832969, 16.944272), (-147.645309, 8.944272))
            Line((-132.428405, 20), (-107.6, 20))
            ThreePointArc((-91.751972, 6.2), (-97.09286, 16.066483), (-107.6, 20))
            Line((-82.8, 6.2), (-91.751972, 6.2))
            Line((-82.8, 3.2), (-82.8, 6.2))
        make_face()
        with Locations((-213.443268, -76.831568)):
            Circle(SKETCH075_R, mode=Mode.SUBTRACT)
        with Locations((-179.304663, -76.831568)):
            Circle(SKETCH075_R, mode=Mode.SUBTRACT)
        with Locations((-184.079668, 34.8)):
            Circle(SKETCH075_R, mode=Mode.SUBTRACT)
        with Locations((-78.51, 34.8)):
            Circle(SKETCH075_R, mode=Mode.SUBTRACT)
        with Locations((-78.51, 7.6)):
            Circle(SKETCH075_R, mode=Mode.SUBTRACT)
        with Locations((-5.6, 34.8)):
            Circle(SKETCH075_R, mode=Mode.SUBTRACT)
        with Locations((-5.6, 7.6)):
            Circle(SKETCH075_R, mode=Mode.SUBTRACT)
        with Locations((-36.2, 21.2)):
            Circle(SKETCH075_R_2, mode=Mode.SUBTRACT)
        with Locations((-24.2, 26.7)):
            Circle(SKETCH075_R_3, mode=Mode.SUBTRACT)
        with Locations((-24.2, 15.7)):
            Circle(SKETCH075_R_3, mode=Mode.SUBTRACT)
        Polygon((-189.938695, 31.567195), (-192.332836, 24.989347), (-196.467483, 26.494236), (-194.073342, 33.072084), (-193.885404, 33.00368), (-190.126633, 31.635599), align=None, mode=Mode.SUBTRACT)
    extrude(amount=EXTRUDE078_DEPTH)

    # Cut045: cut Extrude lato dx pistola - scavi pulsanti
    add(extrude_lato_dx_pistola_scavi_pulsanti.part, mode=Mode.SUBTRACT)

    # Fusion004: union Extrude080
    add(extrude080.part)

    # Cut046: cut Extrude081
    add(extrude081.part, mode=Mode.SUBTRACT)

    # Fusion006: union Cut048
    add(cut048_1.part)


solid = fusion006.part
